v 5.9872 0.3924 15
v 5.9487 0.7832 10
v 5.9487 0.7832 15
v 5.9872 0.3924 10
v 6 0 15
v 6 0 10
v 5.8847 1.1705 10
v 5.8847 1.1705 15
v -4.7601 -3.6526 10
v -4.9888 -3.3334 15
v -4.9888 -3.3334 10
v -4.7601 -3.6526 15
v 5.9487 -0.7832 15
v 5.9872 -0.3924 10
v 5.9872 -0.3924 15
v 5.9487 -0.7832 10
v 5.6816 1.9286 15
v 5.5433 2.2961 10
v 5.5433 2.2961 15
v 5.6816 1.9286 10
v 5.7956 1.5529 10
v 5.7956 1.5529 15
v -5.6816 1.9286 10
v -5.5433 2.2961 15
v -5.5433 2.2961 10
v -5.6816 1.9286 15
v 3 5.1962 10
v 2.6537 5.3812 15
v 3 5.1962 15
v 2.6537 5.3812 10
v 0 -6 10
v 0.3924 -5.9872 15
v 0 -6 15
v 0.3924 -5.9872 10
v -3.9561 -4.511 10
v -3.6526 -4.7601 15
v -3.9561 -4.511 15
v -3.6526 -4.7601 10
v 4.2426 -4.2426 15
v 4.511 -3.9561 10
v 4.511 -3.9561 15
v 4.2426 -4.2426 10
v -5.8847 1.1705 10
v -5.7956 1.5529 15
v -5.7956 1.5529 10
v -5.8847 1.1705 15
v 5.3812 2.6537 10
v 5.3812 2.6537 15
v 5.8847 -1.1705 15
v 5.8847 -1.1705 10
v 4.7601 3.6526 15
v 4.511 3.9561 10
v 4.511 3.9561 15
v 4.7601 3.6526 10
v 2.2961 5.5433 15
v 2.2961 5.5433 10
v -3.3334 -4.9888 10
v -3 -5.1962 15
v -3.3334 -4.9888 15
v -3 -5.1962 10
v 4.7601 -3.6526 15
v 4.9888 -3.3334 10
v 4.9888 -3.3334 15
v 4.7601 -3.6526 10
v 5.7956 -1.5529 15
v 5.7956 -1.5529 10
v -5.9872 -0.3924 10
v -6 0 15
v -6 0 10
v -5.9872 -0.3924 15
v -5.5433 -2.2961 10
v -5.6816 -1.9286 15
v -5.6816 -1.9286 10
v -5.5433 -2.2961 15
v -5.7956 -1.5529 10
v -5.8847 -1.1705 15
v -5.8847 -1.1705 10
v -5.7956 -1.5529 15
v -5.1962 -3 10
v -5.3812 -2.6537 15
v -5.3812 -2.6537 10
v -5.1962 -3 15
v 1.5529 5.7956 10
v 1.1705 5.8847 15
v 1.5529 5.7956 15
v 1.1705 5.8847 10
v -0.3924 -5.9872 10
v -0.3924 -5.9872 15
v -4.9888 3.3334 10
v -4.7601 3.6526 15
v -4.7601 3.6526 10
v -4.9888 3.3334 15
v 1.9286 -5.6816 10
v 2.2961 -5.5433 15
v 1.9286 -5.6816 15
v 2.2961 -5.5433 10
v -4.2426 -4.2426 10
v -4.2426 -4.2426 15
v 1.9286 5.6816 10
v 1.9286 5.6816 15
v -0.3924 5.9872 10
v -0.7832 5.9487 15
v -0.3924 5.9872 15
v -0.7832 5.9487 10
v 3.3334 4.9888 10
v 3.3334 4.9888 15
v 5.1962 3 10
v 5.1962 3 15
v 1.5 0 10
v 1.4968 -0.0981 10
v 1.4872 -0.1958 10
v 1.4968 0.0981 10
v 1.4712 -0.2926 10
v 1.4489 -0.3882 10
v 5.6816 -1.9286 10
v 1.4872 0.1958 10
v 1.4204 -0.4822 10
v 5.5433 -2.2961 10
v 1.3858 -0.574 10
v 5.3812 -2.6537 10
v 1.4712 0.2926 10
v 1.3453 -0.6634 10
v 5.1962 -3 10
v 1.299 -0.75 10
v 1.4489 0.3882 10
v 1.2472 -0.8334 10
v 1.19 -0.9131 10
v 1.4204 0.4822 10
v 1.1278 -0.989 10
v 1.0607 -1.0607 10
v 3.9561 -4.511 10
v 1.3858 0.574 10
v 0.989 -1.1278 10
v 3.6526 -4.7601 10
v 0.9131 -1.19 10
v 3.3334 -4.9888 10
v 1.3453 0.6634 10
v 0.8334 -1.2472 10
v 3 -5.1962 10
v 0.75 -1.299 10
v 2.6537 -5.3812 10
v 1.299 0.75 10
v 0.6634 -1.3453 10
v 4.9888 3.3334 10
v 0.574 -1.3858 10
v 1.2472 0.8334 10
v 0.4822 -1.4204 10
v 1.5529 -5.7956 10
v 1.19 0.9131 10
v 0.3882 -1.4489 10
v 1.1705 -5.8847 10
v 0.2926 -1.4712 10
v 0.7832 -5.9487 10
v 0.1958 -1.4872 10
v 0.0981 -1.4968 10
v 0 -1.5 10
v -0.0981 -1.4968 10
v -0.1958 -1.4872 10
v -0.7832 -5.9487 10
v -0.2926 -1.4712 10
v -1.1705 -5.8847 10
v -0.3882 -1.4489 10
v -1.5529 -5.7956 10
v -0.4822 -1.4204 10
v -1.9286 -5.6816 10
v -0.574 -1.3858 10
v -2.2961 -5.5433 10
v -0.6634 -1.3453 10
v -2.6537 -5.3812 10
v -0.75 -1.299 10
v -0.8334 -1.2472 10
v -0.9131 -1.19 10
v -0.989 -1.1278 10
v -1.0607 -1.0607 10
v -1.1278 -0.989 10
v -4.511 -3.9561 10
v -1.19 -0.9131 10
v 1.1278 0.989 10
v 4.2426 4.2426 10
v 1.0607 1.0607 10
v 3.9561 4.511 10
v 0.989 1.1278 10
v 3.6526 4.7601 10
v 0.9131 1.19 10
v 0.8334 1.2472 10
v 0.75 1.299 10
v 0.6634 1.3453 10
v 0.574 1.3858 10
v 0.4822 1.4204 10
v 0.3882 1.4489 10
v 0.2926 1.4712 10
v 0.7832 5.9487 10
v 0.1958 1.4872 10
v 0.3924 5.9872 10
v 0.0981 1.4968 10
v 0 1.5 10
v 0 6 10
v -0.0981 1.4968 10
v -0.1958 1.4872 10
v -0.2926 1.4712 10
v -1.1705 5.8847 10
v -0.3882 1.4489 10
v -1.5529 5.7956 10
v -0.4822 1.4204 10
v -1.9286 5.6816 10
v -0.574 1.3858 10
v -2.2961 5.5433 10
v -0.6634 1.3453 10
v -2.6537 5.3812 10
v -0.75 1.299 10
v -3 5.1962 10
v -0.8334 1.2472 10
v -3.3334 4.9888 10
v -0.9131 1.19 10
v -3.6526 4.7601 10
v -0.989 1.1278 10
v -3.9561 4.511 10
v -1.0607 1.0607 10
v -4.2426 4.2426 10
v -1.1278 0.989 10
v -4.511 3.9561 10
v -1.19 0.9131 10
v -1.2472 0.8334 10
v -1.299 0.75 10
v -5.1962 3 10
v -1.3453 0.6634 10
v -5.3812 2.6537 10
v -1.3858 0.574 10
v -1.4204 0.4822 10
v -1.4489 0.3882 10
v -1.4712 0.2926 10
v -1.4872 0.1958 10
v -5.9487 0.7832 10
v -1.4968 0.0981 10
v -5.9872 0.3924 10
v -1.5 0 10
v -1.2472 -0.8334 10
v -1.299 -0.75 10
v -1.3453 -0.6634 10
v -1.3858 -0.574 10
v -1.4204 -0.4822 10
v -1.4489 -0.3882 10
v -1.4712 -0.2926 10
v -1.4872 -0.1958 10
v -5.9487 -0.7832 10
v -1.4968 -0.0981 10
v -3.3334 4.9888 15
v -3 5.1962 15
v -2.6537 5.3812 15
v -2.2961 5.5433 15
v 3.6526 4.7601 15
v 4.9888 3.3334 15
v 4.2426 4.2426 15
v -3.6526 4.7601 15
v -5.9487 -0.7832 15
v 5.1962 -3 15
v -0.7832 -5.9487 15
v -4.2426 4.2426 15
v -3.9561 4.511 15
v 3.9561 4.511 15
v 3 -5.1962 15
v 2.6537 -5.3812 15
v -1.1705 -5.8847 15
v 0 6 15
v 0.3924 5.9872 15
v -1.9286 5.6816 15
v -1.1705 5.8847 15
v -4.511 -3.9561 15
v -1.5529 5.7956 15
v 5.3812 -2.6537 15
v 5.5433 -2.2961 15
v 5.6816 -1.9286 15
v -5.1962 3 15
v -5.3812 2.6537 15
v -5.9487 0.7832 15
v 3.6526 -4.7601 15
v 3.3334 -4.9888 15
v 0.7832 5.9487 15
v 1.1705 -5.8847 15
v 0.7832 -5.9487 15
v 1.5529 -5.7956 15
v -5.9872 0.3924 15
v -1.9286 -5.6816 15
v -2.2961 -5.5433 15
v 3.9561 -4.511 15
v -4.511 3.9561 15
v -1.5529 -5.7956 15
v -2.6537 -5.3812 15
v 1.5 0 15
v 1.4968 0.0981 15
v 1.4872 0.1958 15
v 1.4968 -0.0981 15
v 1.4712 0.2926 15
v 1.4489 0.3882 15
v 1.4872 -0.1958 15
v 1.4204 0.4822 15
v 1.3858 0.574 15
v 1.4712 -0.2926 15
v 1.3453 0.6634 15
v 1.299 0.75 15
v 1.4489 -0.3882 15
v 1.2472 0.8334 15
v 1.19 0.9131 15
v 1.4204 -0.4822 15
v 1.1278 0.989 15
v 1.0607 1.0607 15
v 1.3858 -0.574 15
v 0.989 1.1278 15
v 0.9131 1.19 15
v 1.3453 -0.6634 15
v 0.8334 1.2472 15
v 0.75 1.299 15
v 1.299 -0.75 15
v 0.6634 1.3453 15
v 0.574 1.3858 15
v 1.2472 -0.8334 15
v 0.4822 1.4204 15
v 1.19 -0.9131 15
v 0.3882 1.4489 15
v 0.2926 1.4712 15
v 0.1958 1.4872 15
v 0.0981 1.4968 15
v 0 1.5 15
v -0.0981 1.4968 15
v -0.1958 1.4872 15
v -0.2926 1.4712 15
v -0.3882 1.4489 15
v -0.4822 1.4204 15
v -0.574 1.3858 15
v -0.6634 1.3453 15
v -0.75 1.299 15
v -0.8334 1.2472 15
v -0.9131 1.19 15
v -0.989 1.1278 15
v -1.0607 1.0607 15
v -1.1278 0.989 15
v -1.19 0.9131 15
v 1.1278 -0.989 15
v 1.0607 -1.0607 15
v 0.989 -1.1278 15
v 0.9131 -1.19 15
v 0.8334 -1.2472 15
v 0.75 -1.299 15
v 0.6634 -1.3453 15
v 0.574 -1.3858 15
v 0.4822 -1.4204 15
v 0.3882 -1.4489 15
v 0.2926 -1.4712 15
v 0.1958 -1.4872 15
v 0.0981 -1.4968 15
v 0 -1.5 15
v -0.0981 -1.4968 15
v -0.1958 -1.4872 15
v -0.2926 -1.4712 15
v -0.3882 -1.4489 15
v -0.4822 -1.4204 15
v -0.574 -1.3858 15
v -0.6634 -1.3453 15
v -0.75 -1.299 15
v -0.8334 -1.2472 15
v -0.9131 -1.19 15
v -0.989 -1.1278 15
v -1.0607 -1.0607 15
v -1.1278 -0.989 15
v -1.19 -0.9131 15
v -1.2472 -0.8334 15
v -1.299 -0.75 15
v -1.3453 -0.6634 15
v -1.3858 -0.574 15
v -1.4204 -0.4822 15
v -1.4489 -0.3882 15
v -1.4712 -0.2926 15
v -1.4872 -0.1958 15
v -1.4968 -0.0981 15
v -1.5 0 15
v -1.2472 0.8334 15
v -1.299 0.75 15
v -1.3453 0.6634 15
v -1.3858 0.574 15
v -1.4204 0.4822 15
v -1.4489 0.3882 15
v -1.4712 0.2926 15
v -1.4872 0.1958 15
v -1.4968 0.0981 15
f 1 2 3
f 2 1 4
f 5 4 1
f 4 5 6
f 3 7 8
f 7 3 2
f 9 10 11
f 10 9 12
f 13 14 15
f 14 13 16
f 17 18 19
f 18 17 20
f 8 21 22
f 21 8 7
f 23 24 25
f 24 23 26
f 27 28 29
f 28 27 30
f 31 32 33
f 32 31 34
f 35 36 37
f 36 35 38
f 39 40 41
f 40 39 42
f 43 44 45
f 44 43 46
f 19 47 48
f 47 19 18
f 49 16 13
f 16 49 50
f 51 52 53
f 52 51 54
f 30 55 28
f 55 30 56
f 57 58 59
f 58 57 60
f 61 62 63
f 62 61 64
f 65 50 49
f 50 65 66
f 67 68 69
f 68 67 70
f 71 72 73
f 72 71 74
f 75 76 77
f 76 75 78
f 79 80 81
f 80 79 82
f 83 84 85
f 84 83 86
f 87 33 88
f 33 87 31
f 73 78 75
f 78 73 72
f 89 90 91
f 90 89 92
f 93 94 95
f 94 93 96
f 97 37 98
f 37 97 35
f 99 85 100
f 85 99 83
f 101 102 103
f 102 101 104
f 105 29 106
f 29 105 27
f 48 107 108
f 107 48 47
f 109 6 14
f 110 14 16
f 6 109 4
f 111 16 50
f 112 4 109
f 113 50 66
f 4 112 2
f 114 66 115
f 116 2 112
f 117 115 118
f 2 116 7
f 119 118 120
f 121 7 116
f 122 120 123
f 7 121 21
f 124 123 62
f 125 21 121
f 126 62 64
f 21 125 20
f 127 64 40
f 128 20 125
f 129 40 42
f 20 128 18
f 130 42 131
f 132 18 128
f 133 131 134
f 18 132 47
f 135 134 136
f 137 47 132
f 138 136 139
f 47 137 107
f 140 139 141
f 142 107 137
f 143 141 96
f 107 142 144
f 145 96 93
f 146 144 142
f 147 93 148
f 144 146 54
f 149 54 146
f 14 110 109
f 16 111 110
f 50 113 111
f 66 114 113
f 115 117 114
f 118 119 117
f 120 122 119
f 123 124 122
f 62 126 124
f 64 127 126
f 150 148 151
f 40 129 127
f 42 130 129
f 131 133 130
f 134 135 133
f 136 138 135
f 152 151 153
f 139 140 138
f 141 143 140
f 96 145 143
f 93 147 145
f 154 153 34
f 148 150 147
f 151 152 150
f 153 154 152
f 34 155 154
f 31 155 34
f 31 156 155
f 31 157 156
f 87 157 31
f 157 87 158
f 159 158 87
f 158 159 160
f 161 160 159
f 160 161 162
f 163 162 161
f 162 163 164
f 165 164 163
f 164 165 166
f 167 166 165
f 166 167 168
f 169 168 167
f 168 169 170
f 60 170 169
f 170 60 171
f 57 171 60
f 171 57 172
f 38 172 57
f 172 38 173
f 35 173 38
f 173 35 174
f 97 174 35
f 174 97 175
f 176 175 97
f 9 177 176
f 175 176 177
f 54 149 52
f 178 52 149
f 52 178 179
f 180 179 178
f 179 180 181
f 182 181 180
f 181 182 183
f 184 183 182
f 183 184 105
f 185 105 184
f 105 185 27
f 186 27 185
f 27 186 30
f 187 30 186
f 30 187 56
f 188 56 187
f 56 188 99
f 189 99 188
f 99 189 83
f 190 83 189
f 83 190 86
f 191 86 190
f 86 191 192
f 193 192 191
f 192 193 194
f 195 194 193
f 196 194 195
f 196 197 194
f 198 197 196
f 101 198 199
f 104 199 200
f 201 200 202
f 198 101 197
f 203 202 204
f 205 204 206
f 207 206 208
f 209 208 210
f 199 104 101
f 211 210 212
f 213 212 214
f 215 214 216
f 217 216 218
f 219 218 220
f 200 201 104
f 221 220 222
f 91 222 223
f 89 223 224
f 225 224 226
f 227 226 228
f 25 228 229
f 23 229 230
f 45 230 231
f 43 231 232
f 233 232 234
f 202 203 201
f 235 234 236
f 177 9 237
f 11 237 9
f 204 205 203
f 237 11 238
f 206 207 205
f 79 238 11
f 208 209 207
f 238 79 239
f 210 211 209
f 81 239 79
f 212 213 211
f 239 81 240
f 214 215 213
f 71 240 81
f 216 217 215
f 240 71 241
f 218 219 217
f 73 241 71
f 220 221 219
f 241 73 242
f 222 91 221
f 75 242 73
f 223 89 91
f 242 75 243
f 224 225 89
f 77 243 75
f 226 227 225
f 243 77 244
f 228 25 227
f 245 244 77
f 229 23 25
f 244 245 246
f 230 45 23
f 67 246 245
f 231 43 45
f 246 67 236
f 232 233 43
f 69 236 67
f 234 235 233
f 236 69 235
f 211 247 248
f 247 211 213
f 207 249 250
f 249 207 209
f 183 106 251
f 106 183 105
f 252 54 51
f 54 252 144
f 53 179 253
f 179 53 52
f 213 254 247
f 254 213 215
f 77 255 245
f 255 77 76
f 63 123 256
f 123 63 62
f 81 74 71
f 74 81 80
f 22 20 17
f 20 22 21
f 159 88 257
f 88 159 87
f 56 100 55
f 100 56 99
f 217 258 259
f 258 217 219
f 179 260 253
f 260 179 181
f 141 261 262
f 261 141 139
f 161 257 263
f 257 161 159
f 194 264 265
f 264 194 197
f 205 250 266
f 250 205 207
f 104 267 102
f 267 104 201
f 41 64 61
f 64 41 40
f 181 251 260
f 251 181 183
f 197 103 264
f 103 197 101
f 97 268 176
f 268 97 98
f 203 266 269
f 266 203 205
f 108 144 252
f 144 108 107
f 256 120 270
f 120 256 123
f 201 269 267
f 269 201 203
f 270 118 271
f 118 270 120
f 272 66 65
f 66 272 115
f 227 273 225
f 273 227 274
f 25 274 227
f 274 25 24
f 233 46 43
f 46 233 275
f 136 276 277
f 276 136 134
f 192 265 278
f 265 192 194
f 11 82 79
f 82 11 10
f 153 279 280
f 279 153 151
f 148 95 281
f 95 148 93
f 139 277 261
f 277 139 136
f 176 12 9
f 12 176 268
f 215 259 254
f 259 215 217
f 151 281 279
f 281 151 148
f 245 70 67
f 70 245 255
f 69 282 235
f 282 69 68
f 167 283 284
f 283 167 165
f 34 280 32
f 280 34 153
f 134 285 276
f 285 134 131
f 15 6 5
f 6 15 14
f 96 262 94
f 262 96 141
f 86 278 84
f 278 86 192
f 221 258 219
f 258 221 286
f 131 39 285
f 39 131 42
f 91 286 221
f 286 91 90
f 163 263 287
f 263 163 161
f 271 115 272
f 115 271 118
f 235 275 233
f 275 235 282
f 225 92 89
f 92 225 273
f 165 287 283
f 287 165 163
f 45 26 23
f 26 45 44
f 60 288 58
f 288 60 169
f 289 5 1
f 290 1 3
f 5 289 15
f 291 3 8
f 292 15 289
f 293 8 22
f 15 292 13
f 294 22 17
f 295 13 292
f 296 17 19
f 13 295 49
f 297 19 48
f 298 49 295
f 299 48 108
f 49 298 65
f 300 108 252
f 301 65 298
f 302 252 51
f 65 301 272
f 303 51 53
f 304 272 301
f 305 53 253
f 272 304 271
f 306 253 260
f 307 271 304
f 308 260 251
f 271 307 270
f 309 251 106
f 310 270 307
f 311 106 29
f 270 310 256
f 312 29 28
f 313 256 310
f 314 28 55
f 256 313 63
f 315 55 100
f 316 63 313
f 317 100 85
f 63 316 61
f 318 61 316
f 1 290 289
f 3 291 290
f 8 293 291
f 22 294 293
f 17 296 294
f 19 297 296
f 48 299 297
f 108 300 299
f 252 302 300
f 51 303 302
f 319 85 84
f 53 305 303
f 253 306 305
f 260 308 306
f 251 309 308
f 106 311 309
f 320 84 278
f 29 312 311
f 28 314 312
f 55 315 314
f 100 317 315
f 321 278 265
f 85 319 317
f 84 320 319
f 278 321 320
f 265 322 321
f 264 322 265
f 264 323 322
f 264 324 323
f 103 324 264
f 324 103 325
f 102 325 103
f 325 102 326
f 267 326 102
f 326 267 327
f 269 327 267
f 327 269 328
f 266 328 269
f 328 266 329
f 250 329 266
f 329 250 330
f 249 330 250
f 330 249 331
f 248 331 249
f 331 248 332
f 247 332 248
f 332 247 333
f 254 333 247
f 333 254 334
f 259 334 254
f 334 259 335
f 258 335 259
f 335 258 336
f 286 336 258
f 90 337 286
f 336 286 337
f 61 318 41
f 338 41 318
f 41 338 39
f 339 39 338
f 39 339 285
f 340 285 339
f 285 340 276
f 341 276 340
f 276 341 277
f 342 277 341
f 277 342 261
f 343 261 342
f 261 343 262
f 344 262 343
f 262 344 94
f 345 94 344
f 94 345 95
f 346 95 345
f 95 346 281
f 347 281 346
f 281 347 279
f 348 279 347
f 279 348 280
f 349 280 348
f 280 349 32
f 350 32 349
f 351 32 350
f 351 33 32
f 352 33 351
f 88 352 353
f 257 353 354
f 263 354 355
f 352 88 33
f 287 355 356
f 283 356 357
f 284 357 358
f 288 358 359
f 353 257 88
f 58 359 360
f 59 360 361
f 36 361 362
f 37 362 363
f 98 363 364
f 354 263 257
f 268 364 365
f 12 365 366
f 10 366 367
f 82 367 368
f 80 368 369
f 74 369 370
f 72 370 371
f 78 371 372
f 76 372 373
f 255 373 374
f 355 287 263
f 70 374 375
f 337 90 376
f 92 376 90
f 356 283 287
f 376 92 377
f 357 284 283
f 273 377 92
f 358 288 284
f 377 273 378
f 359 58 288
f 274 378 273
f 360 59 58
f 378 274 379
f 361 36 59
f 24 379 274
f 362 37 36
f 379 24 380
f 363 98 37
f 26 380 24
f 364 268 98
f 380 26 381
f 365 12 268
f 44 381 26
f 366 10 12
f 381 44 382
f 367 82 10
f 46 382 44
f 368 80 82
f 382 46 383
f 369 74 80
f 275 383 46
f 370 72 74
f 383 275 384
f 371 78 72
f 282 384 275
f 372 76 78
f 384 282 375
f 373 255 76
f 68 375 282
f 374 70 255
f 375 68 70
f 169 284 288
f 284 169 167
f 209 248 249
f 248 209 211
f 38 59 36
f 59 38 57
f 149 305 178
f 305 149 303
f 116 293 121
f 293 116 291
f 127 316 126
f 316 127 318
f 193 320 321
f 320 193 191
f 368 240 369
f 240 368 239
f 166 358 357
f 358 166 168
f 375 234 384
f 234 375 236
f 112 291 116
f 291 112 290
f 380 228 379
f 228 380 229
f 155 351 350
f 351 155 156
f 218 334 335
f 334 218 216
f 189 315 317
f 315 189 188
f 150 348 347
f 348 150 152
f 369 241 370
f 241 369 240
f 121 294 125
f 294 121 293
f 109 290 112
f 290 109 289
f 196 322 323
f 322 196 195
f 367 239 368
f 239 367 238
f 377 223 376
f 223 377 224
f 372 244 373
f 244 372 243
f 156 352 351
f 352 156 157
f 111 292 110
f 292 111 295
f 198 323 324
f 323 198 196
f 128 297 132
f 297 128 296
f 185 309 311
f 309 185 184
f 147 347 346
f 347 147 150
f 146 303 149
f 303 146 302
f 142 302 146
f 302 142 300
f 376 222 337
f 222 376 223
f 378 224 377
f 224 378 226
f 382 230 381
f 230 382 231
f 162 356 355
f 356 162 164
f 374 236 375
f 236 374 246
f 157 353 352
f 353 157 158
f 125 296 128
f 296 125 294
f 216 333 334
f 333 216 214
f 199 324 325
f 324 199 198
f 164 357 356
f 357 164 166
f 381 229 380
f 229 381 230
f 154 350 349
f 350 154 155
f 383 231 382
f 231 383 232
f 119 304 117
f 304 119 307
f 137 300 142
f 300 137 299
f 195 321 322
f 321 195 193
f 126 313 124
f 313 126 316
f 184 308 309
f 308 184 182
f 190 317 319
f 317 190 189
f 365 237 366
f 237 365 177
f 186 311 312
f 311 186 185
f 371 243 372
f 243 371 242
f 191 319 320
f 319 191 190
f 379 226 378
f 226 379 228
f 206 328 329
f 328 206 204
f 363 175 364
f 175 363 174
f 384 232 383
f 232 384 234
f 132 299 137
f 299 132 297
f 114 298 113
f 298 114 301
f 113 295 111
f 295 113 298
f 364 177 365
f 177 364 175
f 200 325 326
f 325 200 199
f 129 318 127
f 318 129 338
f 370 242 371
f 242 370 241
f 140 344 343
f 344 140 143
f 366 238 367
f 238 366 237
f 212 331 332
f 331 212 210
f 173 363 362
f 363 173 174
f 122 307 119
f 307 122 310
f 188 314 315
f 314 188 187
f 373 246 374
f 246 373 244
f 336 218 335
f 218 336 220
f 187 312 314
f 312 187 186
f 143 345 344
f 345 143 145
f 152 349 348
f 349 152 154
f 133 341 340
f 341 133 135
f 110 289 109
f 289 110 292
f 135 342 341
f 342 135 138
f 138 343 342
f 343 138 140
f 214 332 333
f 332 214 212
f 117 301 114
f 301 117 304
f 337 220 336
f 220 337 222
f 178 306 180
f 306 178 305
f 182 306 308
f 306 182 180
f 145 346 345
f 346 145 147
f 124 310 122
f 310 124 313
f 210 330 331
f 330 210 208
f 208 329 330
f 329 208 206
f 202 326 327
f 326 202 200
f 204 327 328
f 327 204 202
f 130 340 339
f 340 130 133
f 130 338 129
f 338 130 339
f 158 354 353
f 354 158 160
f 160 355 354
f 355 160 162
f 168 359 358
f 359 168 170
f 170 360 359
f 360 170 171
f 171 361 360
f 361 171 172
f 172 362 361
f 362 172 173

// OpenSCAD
// Hose-barb reducer: 8 mm ID to 5 mm ID tubing
// Print orientation: standing upright along Z

$fn = 96;

// ---- Dimensions (mm) ----
id_large      = 8;     // inner diameter of 8 mm tubing
id_small      = 5;     // inner diameter of 5 mm tubing
bore          = 3;     // through-bore diameter
barb_h        = 10;    // height of each barb
od_large      = 9.5;   // 8 mm barb outer diameter (top and bottom of sawtooth)
od_small      = 6.5;   // 5 mm barb outer diameter (top and bottom of sawtooth)
collar_d      = 12;    // collar diameter
collar_h      = 5;     // collar height
eps           = 0.5;   // cutter overshoot

// ---- Derived ----
z0     = 0;            // start of 8 mm barbs
z1     = barb_h;       // end of 8 mm barbs / start of collar
z2     = z1 + collar_h;// end of collar / start of 5 mm barbs
z3     = z2 + barb_h;  // end of 5 mm barbs

// ---- Model ----
difference() {
    union() {
        // 8 mm tubing barbs: sawtooth profile, stacked
        for (i = [0 : 1])
            translate([0, 0, z0 + i * barb_h])
                linear_extrude(height = barb_h)
                    polygon([
                        [od_large / 2, 0],
                        [od_large / 2, barb_h / 2],
                        [od_large / 2, barb_h]
                    ]);

        // Collar
        translate([0, 0, z2 - collar_h])
            cylinder(d = collar_d, h = collar_h);

        // 5 mm tubing barbs: sawtooth profile, stacked
        for (i = [0 : 1])
            translate([0, 0, z3 - i * barb_h])
                linear_extrude(height = barb_h)
                    polygon([
                        [od_small / 2, 0],
                        [od_small / 2, barb_h / 2],
                        [od_small / 2, barb_h]
                    ]);
    }

    // Through-bore
    translate([0, 0, z0 - eps])
        cylinder(d = bore, h = z3 + 2 * eps);
}
